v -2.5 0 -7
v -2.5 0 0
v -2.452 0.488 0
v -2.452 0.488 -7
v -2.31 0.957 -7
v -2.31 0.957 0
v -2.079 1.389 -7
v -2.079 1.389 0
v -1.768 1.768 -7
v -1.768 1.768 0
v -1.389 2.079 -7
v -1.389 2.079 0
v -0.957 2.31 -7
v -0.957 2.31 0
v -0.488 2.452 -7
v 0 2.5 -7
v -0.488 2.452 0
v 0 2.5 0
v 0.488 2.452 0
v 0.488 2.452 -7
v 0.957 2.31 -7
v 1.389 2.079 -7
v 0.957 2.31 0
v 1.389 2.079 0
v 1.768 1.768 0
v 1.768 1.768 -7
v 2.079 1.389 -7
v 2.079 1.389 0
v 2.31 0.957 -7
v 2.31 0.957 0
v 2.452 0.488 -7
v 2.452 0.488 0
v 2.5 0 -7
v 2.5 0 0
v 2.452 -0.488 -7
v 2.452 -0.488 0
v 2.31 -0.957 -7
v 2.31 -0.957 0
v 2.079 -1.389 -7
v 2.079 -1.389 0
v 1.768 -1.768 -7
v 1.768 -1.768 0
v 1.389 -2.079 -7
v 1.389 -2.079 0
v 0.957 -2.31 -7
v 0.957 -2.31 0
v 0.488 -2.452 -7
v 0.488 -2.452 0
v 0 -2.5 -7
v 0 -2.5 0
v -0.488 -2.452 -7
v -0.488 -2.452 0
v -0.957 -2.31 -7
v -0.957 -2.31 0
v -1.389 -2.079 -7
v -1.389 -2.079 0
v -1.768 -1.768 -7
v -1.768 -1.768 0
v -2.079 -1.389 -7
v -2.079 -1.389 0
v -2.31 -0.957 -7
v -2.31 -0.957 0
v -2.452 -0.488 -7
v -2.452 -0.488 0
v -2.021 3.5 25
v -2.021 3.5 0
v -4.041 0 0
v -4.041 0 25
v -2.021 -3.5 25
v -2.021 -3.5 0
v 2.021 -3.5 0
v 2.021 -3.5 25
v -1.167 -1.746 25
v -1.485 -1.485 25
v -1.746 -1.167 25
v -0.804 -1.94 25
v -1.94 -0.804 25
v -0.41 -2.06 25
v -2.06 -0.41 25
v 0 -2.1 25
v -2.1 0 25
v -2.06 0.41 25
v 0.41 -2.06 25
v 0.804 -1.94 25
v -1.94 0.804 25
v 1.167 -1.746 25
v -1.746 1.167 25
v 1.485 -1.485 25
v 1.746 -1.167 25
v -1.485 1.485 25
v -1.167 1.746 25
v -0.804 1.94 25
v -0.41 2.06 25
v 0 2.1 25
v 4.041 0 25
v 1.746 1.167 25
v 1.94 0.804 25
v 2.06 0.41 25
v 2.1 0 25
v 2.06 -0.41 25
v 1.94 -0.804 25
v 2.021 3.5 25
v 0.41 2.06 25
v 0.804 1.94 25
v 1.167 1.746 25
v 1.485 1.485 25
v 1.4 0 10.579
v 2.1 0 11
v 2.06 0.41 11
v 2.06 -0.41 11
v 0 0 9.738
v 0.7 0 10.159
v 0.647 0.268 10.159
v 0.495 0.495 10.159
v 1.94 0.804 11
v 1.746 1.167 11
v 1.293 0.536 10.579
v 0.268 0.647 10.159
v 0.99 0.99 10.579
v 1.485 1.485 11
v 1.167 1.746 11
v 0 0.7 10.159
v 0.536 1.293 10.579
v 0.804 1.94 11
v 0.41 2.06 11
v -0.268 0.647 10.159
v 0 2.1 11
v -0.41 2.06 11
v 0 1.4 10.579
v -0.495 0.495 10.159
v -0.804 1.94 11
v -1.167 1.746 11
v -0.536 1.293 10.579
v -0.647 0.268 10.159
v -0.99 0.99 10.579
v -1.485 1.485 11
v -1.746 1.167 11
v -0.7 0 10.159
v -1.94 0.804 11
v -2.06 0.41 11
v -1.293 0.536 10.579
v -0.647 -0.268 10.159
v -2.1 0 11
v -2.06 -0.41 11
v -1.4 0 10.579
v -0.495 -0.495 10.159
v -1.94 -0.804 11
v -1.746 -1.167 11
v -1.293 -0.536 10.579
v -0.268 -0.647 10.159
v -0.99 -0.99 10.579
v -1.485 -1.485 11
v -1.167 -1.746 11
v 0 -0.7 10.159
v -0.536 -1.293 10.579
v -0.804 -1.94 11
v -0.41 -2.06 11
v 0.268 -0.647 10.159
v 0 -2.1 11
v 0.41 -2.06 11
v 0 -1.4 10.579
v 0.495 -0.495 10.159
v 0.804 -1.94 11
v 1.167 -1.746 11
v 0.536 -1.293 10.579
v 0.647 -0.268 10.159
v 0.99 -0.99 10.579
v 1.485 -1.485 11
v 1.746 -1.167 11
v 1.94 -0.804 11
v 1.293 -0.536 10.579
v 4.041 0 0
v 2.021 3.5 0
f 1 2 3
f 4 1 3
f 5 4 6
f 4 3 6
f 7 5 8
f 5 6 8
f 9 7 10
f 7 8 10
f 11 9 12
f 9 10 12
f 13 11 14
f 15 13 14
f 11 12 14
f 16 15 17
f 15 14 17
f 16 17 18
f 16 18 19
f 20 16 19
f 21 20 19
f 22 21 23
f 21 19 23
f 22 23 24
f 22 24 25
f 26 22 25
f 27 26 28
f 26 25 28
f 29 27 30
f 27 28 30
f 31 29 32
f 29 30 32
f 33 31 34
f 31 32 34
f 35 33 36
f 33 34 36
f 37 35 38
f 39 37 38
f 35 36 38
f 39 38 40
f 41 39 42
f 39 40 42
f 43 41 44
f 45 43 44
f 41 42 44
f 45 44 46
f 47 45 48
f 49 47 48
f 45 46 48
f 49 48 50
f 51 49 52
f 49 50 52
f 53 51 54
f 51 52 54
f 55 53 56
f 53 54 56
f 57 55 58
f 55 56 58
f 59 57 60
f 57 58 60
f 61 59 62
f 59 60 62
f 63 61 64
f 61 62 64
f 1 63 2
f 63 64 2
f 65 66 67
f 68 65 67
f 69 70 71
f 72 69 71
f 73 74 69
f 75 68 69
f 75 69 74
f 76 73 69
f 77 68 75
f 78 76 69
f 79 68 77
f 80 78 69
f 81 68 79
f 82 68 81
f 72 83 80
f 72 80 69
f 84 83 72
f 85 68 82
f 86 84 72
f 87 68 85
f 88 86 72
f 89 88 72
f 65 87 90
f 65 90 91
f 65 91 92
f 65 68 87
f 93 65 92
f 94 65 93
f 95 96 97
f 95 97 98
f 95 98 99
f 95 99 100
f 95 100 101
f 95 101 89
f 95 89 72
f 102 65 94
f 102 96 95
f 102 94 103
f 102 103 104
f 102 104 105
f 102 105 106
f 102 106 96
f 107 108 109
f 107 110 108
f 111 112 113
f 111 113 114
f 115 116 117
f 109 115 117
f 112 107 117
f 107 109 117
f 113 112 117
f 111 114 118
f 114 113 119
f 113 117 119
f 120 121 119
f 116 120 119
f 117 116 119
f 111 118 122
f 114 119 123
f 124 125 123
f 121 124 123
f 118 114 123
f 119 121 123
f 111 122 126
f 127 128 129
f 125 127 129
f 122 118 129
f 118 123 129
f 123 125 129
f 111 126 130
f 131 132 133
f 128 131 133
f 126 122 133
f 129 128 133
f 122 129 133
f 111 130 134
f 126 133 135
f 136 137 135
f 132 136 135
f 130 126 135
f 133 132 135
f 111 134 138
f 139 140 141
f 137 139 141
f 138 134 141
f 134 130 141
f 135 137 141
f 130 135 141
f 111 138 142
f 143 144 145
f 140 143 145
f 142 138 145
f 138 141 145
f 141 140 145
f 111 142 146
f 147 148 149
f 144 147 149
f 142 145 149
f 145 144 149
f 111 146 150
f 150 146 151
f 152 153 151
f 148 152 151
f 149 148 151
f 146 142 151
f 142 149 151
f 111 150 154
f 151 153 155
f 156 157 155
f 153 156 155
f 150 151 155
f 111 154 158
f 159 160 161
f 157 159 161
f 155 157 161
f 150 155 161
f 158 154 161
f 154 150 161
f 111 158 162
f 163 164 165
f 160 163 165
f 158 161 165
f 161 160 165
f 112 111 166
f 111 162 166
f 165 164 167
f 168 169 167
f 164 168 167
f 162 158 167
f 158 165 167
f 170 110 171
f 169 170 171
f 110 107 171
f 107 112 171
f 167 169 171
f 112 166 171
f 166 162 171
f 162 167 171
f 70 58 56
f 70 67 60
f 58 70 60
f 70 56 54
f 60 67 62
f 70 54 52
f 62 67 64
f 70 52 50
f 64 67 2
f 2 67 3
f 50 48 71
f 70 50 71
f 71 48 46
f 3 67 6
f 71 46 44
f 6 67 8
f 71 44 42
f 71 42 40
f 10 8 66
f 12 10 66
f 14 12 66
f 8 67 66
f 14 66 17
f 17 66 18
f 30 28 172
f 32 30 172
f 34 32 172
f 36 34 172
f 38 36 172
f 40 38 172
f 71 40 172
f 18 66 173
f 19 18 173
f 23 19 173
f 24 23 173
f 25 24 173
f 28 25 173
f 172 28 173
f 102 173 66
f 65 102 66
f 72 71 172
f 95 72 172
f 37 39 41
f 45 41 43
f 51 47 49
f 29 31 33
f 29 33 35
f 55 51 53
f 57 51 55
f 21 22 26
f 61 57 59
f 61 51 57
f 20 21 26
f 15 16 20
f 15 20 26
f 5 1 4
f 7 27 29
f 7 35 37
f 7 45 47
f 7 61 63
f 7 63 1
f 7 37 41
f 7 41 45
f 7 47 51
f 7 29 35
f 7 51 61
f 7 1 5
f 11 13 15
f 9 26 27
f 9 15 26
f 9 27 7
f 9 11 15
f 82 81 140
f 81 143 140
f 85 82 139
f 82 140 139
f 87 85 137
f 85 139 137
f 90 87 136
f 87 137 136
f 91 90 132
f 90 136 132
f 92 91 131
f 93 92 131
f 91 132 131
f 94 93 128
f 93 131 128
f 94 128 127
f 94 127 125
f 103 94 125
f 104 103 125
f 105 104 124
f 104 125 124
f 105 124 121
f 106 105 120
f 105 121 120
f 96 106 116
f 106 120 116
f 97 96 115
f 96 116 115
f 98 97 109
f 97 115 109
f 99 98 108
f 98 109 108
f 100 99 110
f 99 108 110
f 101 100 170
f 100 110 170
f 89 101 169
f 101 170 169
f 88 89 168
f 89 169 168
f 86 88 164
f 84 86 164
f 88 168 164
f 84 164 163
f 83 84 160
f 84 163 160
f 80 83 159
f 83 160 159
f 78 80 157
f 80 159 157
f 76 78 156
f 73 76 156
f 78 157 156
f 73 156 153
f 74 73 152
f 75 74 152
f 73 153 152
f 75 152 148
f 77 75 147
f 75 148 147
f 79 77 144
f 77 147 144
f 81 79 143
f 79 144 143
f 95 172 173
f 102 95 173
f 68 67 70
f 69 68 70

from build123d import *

# Parameters (mm, degrees)
EXTRUDE_1_DEPTH           = 25
SKETCH_4_R                = 2.5
EXTRUDE_2_DEPTH           = 7
M5X0_8_TAPPED_HOLE1_D     = 4.2
M5X0_8_TAPPED_HOLE1_DEPTH = 14
M5X0_8_TAPPED_HOLE1_TIP   = 1.2618073


with BuildPart() as part:
    # 草圖1 → 填料-伸長1 (new body)
    with BuildSketch(Plane.XY):
        Polygon((-2.020725942, 3.5), (-4.041451884, 0), (-2.020725942, -3.5), (2.020725942, -3.5), (4.041451884, 0), (2.020725942, 3.5), align=None)
    extrude(amount=EXTRUDE_1_DEPTH)

    # 草圖4 → 填料-伸長2 (add)
    with BuildSketch(Plane(origin=(0, 0, 0), x_dir=(-1, 0, 0), z_dir=(0, 0, -1))):
        Circle(SKETCH_4_R)
    extrude(amount=EXTRUDE_2_DEPTH)

    # M5x0.8 Tapped Hole1
    with Locations(Plane.XY.offset(25)):
        with Locations((0, 0)):
            Hole(M5X0_8_TAPPED_HOLE1_D / 2, depth=M5X0_8_TAPPED_HOLE1_DEPTH)
            with Locations((0, 0, -(M5X0_8_TAPPED_HOLE1_DEPTH + M5X0_8_TAPPED_HOLE1_TIP / 2))):  # 118° drill point
                Cone(0, M5X0_8_TAPPED_HOLE1_D / 2, M5X0_8_TAPPED_HOLE1_TIP, mode=Mode.SUBTRACT)


solid = part.part
